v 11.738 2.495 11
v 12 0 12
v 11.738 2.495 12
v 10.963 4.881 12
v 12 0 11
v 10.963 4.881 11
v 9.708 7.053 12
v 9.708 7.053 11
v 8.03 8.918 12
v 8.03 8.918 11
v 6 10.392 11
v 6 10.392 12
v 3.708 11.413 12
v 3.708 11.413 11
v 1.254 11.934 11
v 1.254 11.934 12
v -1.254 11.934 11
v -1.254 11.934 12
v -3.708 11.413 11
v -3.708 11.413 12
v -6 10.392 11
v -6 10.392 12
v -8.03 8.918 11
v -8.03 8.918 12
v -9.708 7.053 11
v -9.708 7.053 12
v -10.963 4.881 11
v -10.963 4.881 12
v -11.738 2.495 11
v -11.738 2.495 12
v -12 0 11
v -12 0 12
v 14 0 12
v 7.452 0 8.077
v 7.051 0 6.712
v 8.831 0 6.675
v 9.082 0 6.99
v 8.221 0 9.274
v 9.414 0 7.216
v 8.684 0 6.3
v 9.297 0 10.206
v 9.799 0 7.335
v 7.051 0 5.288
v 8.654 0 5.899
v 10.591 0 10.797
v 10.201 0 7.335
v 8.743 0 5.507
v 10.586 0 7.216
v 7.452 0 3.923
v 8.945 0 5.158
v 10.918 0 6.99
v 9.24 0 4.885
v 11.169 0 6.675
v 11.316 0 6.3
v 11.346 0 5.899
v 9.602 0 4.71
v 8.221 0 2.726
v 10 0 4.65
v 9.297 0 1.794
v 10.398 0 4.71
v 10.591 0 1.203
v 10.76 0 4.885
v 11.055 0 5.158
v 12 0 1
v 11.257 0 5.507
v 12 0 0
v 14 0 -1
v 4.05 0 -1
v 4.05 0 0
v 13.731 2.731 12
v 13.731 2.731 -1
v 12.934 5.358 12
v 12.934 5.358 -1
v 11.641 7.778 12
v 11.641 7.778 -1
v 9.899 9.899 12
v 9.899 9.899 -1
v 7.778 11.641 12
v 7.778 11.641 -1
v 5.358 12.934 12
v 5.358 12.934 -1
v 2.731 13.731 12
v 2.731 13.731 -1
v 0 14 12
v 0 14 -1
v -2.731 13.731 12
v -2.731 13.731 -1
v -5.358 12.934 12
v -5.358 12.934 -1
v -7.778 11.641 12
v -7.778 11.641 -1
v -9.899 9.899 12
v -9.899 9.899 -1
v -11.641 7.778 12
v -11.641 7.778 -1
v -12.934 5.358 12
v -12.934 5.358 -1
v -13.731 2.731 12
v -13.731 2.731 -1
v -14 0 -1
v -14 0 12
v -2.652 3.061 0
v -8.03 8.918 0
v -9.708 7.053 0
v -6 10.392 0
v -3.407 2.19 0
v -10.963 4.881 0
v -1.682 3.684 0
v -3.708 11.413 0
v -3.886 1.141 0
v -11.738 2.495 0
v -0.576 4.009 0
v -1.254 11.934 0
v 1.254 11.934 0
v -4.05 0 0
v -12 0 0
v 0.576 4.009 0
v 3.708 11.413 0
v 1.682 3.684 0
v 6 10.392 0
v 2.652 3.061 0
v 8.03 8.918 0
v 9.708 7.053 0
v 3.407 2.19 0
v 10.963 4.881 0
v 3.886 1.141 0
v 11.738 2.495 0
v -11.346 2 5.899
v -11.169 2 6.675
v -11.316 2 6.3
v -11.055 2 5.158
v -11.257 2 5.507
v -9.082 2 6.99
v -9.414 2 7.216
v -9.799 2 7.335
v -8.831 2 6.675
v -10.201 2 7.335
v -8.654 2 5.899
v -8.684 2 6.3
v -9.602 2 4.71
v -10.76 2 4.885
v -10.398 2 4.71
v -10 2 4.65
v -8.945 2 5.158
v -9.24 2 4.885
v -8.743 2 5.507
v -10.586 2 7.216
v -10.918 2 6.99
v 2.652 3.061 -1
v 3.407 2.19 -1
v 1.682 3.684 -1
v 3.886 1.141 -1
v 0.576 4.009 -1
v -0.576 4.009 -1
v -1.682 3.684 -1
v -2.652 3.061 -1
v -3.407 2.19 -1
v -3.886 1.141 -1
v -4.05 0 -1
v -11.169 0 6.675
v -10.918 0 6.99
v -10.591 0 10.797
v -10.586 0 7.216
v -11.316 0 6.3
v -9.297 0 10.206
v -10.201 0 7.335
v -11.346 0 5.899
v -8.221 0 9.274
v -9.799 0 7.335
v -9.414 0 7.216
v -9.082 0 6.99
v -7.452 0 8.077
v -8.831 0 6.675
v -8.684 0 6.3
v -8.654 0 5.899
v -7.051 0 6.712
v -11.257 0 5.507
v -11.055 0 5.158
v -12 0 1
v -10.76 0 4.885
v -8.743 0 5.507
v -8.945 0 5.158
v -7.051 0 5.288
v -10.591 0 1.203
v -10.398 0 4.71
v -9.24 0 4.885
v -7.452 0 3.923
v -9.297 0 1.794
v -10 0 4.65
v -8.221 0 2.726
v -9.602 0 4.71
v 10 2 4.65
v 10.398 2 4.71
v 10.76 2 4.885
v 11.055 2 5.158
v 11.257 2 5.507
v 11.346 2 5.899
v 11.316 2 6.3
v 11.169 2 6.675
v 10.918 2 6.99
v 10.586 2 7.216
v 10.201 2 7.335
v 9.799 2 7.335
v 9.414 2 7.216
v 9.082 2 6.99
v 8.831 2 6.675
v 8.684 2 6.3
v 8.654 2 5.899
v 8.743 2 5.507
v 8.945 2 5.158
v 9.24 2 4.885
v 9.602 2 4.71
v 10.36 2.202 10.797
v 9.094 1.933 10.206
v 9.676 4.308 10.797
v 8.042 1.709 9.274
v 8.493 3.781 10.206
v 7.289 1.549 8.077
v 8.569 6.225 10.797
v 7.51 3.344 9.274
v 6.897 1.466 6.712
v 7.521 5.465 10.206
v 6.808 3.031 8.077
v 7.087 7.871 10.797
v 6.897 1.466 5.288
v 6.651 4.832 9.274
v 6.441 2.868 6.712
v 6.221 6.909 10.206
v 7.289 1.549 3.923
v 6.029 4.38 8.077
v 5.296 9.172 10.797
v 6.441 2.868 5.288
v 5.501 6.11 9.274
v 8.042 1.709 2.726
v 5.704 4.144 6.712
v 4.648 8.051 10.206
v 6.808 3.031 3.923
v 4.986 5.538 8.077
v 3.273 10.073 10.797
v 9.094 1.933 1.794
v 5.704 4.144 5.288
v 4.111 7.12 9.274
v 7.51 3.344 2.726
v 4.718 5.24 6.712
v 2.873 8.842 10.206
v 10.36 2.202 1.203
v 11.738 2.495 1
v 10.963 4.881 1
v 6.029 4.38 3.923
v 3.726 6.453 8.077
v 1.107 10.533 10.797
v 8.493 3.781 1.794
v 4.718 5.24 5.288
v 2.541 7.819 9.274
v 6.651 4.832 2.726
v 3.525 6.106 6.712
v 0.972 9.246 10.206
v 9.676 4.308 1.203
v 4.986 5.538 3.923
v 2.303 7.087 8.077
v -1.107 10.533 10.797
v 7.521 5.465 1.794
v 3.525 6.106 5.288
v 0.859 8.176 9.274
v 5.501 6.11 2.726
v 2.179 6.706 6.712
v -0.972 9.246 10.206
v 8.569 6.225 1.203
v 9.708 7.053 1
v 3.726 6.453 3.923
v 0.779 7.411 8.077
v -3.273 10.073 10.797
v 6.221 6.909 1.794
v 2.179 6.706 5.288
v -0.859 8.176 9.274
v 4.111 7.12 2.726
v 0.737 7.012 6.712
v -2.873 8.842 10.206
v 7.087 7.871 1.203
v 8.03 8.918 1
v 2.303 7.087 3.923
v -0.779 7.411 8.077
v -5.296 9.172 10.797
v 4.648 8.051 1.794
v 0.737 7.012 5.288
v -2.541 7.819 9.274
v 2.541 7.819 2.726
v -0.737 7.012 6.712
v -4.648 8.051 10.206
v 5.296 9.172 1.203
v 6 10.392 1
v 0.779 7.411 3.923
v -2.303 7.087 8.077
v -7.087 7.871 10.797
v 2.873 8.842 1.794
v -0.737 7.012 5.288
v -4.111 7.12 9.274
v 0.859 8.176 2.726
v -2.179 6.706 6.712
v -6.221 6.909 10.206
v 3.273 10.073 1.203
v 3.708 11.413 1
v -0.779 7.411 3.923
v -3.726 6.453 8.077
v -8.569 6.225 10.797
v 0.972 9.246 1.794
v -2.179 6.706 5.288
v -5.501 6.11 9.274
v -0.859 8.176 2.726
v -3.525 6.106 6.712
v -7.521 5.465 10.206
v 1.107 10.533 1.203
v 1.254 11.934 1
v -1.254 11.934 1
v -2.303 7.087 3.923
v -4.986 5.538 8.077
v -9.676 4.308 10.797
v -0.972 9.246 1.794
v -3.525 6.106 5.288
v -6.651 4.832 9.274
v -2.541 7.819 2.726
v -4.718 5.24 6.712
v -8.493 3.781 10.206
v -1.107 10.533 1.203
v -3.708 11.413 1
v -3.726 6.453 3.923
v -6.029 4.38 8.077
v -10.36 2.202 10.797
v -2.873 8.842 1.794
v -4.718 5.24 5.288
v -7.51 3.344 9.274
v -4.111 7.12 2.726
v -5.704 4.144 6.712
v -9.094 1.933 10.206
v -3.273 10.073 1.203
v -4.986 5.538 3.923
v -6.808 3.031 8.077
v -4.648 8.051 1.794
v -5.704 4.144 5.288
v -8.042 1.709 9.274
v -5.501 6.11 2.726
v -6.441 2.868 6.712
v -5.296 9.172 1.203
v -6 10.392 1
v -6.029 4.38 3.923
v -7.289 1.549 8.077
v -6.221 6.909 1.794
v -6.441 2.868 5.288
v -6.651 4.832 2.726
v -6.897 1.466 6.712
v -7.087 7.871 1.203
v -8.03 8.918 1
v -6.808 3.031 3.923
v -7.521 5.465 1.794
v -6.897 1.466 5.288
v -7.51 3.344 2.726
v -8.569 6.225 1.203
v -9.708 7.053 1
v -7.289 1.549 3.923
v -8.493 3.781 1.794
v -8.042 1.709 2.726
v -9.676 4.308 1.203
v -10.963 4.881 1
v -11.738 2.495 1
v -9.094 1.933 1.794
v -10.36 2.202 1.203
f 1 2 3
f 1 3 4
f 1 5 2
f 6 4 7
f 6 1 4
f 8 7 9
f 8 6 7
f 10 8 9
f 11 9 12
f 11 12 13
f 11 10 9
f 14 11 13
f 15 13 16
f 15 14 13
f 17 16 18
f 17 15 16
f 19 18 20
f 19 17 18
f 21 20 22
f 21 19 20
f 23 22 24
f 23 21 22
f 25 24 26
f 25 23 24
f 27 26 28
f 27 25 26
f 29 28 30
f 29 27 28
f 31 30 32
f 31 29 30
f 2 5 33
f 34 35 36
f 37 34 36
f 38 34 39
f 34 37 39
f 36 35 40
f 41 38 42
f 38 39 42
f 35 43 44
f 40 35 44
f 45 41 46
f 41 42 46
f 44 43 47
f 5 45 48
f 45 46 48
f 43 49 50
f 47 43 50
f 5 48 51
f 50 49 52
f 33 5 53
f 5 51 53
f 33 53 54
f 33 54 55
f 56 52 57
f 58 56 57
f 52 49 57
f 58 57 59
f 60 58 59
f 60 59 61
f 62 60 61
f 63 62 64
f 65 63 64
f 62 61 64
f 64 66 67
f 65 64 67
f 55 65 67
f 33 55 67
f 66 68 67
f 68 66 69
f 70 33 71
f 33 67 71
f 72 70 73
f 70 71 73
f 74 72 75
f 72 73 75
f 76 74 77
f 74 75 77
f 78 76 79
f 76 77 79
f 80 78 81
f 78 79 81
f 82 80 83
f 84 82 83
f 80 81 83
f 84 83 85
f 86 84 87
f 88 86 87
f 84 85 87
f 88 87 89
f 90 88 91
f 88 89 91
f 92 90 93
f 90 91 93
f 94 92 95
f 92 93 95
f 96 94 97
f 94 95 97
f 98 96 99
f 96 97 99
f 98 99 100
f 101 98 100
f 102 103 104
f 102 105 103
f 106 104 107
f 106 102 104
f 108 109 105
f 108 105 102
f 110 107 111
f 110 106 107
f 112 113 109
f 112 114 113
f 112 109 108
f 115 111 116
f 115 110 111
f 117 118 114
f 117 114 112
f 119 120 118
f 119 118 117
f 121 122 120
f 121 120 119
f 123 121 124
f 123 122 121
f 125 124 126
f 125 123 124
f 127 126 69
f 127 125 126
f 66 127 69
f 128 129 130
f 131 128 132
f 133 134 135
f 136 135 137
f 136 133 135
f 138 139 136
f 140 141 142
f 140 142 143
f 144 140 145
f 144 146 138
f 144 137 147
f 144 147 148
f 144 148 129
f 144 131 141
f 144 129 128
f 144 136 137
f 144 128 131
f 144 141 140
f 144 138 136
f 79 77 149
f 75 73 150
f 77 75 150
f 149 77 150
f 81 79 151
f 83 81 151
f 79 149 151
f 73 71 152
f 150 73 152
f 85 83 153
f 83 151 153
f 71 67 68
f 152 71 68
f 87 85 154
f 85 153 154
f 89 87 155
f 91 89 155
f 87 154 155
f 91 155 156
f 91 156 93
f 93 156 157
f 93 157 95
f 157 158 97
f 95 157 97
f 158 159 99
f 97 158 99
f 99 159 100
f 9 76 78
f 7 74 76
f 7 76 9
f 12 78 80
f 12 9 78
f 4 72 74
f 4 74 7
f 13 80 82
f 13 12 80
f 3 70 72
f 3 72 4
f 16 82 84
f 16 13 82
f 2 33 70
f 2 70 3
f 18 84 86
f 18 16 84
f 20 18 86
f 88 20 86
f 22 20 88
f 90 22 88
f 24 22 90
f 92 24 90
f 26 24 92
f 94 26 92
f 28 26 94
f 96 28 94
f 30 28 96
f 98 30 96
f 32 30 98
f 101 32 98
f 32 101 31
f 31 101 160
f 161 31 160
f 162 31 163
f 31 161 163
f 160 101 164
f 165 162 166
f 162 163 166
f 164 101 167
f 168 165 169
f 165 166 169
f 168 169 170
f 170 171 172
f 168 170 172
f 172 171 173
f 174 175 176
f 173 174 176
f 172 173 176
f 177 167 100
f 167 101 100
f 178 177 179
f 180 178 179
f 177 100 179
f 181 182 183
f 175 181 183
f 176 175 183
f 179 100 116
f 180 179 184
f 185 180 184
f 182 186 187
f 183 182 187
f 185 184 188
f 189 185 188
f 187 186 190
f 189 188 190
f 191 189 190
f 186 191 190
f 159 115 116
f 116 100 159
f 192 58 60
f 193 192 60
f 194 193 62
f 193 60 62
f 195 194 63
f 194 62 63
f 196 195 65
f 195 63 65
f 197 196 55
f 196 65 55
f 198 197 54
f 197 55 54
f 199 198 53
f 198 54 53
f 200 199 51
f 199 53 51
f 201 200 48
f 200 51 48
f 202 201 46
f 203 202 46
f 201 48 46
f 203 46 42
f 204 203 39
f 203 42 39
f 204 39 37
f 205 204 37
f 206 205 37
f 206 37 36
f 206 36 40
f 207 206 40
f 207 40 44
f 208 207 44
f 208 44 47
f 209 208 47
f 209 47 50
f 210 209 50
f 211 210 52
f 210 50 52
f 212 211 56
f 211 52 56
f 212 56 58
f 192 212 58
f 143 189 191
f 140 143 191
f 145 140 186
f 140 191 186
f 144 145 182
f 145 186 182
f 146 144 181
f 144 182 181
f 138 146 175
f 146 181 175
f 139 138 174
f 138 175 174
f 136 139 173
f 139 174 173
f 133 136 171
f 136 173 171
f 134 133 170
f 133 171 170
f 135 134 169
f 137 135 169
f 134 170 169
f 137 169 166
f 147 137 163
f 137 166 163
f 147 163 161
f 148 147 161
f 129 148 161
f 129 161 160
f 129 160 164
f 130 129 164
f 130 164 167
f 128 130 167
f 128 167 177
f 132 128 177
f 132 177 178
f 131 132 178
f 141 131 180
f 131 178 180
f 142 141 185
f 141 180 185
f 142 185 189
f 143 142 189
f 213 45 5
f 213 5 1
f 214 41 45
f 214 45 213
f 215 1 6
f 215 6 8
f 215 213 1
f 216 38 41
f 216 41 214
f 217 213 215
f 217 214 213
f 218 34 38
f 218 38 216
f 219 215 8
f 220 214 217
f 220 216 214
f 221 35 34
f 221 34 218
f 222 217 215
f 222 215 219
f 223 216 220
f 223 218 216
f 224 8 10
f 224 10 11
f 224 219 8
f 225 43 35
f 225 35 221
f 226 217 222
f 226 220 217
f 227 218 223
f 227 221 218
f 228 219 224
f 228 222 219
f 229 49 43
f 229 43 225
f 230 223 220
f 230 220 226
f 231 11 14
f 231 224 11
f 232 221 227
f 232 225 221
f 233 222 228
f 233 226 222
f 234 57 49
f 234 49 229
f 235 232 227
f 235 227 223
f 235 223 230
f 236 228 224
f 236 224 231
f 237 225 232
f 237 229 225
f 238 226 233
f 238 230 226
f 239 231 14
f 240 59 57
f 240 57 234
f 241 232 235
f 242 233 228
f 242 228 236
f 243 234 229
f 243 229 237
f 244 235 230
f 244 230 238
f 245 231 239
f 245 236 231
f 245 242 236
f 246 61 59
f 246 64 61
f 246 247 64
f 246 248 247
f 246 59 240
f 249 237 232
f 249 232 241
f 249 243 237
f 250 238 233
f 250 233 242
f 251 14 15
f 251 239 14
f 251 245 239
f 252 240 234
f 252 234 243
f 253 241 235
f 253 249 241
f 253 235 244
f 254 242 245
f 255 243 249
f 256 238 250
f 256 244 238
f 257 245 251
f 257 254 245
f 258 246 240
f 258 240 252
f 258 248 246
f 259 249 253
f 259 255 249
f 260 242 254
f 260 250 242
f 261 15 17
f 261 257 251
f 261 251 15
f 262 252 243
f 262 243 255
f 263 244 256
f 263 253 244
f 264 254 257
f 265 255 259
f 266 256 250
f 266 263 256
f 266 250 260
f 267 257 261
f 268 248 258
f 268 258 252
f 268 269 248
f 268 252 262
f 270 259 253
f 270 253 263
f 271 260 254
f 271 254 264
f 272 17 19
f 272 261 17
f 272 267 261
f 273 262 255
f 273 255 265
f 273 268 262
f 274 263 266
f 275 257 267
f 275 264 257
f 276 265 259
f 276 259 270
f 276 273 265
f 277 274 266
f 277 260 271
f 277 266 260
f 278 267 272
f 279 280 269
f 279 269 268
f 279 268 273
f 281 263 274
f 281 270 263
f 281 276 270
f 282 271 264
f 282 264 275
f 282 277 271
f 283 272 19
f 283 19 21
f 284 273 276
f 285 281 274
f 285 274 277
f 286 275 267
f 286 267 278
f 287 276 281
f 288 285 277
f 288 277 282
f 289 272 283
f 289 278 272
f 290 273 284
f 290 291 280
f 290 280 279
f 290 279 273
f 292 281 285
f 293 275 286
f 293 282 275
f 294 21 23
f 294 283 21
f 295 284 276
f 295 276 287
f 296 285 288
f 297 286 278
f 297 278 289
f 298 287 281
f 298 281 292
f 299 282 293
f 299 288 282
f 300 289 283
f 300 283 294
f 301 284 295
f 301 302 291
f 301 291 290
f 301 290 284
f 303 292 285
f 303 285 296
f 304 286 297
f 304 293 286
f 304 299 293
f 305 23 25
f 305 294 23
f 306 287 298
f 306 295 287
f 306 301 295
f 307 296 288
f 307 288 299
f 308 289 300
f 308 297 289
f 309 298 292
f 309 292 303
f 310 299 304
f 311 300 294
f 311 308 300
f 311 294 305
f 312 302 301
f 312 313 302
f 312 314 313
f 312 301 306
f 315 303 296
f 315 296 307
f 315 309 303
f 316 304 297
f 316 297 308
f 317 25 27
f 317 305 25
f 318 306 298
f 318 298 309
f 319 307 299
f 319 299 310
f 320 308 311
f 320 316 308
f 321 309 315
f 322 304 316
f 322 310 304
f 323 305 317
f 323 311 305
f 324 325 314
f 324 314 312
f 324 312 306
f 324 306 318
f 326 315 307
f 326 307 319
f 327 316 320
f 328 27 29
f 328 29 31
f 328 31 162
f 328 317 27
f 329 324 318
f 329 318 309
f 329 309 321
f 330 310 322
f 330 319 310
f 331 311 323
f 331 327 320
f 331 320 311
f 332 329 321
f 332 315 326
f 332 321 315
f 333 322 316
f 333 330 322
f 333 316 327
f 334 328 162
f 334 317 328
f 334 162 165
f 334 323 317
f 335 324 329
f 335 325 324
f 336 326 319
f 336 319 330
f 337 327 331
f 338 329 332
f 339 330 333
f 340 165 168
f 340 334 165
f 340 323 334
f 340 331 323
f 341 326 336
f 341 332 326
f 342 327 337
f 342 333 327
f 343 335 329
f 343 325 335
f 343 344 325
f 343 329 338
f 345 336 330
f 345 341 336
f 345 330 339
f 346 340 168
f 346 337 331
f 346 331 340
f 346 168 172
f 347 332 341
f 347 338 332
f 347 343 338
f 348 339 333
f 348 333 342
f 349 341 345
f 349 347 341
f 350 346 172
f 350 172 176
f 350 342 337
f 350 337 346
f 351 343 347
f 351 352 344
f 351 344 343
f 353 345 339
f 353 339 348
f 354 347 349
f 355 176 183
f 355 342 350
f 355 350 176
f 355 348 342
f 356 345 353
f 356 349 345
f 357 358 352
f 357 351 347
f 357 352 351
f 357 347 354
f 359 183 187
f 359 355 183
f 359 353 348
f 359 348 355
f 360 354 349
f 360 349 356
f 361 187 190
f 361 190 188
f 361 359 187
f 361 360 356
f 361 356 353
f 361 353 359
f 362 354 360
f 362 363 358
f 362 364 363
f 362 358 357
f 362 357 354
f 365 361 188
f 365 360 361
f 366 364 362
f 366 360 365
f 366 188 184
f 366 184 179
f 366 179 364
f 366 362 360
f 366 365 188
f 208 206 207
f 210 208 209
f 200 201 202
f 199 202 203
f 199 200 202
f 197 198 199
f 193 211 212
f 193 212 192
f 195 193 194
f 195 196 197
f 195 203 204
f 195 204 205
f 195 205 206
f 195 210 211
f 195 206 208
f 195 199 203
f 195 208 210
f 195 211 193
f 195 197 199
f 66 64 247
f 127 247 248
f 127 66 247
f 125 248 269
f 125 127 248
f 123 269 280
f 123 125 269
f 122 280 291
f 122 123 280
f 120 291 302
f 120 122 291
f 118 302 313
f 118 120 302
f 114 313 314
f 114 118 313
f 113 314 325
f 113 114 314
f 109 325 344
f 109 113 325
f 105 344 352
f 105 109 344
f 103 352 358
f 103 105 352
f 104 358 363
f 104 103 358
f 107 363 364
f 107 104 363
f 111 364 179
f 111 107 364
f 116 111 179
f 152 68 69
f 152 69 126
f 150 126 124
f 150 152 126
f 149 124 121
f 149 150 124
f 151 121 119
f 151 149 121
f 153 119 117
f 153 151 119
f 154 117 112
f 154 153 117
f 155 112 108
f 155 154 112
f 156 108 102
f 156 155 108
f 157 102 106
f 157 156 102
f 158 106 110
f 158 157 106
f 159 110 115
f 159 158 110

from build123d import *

# Parameters (mm, degrees)
SKETCH_1_R               = 12
EXTRUDE_1_DEPTH          = 12
OTHER_1_2_OUTLINE_R      = 12
OTHER_1_2_OUTLINE_R_2    = 5
OTHER_1_2_DEPTH          = 12
OTHER_1_3_OUTLINE_R      = 5
OTHER_1_3_OUTLINE_R_2    = 4
OTHER_1_3_DEPTH          = 4
OTHER_START              = 8
OTHER_1_4_OUTLINE_R      = 5
OTHER_1_4_OUTLINE_R_2    = 4
OTHER_1_4_DEPTH          = 4
SKETCH_2_R               = 12
EXTRUDE_2_DEPTH          = 1
SKETCH_3_W               = 2
SKETCH_3_H               = 13
SKETCH_4_R               = 1
EXTRUDE_3_DEPTH          = 4
SKETCH_5_W               = 34.262916627
SKETCH_5_H               = 20.154656839
CUT_EXTRUDE_3_DEPTH      = 24.151673806
SKETCH_6_R               = 1.35
CUT_EXTRUDE_4_DEPTH      = 2
CUT_EXTRUDE_5_DEPTH      = 10
CUT_EXTRUDE_5_DEPTH_BACK = 10
SKETCH_7_R               = 4.05


with BuildPart() as part:
    # 草图1 → 凸台-拉伸1 (new body)
    with BuildSketch(Plane.XY):
        Circle(SKETCH_1_R)
    extrude(amount=EXTRUDE_1_DEPTH)

    # Other 1 2 outline → Other 1 2 (cut)
    with BuildSketch(Plane.XY):
        Circle(OTHER_1_2_OUTLINE_R)
        Circle(OTHER_1_2_OUTLINE_R_2, mode=Mode.SUBTRACT)
    extrude(amount=OTHER_1_2_DEPTH, mode=Mode.SUBTRACT)

    # Other 1 3 outline → Other 1 3 (cut)
    with BuildSketch(Plane.XY):
        Circle(OTHER_1_3_OUTLINE_R)
        Circle(OTHER_1_3_OUTLINE_R_2, mode=Mode.SUBTRACT)
    extrude(amount=OTHER_1_3_DEPTH, mode=Mode.SUBTRACT)

    # Other 1 4 outline → Other 1 4 (cut)
    with BuildSketch(Plane.XY.offset(OTHER_START)):
        Circle(OTHER_1_4_OUTLINE_R)
        Circle(OTHER_1_4_OUTLINE_R_2, mode=Mode.SUBTRACT)
    extrude(amount=OTHER_1_4_DEPTH, mode=Mode.SUBTRACT)


with BuildPart() as body_2:
    # 型腔1: read off the stored shape, not the designer's step
    # 型腔1 outline → 型腔1 (revolve)
    with BuildSketch(Plane.XZ):
        with BuildLine():
            Line((12, 1), (12, 11))
            ThreePointArc((12, 11), (7, 6), (12, 1))
        make_face()
    revolve(axis=Axis((0, 0, 0), (0, 0, 1)))



with BuildPart() as body_2_2:
    # 草图2 → 凸台-拉伸2 (new body)
    with BuildSketch(Plane.XY):
        with Locations(Location((0, 0, 0), (0, 0, 270))):
            Circle(SKETCH_2_R)
    extrude(amount=-EXTRUDE_2_DEPTH)


with BuildPart() as body_2_1:
    add(body_2.part)

    add(body_2_2.part)  # 旋转1 merges body 2 2
    # 草图3 → 旋转1 (revolve)
    with BuildSketch(Plane(origin=(0, 0, 0), x_dir=(1, 0, 0), z_dir=(0, 1, 0))):
        with Locations((-13, -5.5)):
            Rectangle(SKETCH_3_W, SKETCH_3_H)
    revolve(axis=Axis((0, 0, 0), (0, 0, 1)))

    # 草图4 → 凸台-拉伸3 (add)
    with BuildSketch(Plane.XY):
        Circle(SKETCH_4_R)
    extrude(amount=EXTRUDE_3_DEPTH)

    # 草图5 → 切除-拉伸3 (cut, through all)
    with BuildSketch(Plane(origin=(0, 0, 0), x_dir=(1, 0, 0), z_dir=(0, 1, 0))):
        with Locations((0.6382308, -6.140467699)):
            Rectangle(SKETCH_5_W, SKETCH_5_H)
    extrude(amount=-CUT_EXTRUDE_3_DEPTH, mode=Mode.SUBTRACT)

    # 草图6 → 切除-拉伸4 (cut)
    with BuildSketch(Plane.XZ):
        with Locations(Location((10, 6, 0), (0, 0, 270))):
            Circle(SKETCH_6_R)
        with Locations(Location((-10, 6, 0), (0, 0, 270))):
            Circle(SKETCH_6_R)
    extrude(amount=-CUT_EXTRUDE_4_DEPTH, mode=Mode.SUBTRACT)

    # 草图7 → 切除-拉伸5 (cut, two sides: drawn at the far end of the back side and taken through both)
    with BuildSketch(Plane.XY.offset(-CUT_EXTRUDE_5_DEPTH_BACK)):
        Circle(SKETCH_7_R)
    extrude(amount=CUT_EXTRUDE_5_DEPTH + CUT_EXTRUDE_5_DEPTH_BACK, mode=Mode.SUBTRACT)


solid = body_2_1.part
